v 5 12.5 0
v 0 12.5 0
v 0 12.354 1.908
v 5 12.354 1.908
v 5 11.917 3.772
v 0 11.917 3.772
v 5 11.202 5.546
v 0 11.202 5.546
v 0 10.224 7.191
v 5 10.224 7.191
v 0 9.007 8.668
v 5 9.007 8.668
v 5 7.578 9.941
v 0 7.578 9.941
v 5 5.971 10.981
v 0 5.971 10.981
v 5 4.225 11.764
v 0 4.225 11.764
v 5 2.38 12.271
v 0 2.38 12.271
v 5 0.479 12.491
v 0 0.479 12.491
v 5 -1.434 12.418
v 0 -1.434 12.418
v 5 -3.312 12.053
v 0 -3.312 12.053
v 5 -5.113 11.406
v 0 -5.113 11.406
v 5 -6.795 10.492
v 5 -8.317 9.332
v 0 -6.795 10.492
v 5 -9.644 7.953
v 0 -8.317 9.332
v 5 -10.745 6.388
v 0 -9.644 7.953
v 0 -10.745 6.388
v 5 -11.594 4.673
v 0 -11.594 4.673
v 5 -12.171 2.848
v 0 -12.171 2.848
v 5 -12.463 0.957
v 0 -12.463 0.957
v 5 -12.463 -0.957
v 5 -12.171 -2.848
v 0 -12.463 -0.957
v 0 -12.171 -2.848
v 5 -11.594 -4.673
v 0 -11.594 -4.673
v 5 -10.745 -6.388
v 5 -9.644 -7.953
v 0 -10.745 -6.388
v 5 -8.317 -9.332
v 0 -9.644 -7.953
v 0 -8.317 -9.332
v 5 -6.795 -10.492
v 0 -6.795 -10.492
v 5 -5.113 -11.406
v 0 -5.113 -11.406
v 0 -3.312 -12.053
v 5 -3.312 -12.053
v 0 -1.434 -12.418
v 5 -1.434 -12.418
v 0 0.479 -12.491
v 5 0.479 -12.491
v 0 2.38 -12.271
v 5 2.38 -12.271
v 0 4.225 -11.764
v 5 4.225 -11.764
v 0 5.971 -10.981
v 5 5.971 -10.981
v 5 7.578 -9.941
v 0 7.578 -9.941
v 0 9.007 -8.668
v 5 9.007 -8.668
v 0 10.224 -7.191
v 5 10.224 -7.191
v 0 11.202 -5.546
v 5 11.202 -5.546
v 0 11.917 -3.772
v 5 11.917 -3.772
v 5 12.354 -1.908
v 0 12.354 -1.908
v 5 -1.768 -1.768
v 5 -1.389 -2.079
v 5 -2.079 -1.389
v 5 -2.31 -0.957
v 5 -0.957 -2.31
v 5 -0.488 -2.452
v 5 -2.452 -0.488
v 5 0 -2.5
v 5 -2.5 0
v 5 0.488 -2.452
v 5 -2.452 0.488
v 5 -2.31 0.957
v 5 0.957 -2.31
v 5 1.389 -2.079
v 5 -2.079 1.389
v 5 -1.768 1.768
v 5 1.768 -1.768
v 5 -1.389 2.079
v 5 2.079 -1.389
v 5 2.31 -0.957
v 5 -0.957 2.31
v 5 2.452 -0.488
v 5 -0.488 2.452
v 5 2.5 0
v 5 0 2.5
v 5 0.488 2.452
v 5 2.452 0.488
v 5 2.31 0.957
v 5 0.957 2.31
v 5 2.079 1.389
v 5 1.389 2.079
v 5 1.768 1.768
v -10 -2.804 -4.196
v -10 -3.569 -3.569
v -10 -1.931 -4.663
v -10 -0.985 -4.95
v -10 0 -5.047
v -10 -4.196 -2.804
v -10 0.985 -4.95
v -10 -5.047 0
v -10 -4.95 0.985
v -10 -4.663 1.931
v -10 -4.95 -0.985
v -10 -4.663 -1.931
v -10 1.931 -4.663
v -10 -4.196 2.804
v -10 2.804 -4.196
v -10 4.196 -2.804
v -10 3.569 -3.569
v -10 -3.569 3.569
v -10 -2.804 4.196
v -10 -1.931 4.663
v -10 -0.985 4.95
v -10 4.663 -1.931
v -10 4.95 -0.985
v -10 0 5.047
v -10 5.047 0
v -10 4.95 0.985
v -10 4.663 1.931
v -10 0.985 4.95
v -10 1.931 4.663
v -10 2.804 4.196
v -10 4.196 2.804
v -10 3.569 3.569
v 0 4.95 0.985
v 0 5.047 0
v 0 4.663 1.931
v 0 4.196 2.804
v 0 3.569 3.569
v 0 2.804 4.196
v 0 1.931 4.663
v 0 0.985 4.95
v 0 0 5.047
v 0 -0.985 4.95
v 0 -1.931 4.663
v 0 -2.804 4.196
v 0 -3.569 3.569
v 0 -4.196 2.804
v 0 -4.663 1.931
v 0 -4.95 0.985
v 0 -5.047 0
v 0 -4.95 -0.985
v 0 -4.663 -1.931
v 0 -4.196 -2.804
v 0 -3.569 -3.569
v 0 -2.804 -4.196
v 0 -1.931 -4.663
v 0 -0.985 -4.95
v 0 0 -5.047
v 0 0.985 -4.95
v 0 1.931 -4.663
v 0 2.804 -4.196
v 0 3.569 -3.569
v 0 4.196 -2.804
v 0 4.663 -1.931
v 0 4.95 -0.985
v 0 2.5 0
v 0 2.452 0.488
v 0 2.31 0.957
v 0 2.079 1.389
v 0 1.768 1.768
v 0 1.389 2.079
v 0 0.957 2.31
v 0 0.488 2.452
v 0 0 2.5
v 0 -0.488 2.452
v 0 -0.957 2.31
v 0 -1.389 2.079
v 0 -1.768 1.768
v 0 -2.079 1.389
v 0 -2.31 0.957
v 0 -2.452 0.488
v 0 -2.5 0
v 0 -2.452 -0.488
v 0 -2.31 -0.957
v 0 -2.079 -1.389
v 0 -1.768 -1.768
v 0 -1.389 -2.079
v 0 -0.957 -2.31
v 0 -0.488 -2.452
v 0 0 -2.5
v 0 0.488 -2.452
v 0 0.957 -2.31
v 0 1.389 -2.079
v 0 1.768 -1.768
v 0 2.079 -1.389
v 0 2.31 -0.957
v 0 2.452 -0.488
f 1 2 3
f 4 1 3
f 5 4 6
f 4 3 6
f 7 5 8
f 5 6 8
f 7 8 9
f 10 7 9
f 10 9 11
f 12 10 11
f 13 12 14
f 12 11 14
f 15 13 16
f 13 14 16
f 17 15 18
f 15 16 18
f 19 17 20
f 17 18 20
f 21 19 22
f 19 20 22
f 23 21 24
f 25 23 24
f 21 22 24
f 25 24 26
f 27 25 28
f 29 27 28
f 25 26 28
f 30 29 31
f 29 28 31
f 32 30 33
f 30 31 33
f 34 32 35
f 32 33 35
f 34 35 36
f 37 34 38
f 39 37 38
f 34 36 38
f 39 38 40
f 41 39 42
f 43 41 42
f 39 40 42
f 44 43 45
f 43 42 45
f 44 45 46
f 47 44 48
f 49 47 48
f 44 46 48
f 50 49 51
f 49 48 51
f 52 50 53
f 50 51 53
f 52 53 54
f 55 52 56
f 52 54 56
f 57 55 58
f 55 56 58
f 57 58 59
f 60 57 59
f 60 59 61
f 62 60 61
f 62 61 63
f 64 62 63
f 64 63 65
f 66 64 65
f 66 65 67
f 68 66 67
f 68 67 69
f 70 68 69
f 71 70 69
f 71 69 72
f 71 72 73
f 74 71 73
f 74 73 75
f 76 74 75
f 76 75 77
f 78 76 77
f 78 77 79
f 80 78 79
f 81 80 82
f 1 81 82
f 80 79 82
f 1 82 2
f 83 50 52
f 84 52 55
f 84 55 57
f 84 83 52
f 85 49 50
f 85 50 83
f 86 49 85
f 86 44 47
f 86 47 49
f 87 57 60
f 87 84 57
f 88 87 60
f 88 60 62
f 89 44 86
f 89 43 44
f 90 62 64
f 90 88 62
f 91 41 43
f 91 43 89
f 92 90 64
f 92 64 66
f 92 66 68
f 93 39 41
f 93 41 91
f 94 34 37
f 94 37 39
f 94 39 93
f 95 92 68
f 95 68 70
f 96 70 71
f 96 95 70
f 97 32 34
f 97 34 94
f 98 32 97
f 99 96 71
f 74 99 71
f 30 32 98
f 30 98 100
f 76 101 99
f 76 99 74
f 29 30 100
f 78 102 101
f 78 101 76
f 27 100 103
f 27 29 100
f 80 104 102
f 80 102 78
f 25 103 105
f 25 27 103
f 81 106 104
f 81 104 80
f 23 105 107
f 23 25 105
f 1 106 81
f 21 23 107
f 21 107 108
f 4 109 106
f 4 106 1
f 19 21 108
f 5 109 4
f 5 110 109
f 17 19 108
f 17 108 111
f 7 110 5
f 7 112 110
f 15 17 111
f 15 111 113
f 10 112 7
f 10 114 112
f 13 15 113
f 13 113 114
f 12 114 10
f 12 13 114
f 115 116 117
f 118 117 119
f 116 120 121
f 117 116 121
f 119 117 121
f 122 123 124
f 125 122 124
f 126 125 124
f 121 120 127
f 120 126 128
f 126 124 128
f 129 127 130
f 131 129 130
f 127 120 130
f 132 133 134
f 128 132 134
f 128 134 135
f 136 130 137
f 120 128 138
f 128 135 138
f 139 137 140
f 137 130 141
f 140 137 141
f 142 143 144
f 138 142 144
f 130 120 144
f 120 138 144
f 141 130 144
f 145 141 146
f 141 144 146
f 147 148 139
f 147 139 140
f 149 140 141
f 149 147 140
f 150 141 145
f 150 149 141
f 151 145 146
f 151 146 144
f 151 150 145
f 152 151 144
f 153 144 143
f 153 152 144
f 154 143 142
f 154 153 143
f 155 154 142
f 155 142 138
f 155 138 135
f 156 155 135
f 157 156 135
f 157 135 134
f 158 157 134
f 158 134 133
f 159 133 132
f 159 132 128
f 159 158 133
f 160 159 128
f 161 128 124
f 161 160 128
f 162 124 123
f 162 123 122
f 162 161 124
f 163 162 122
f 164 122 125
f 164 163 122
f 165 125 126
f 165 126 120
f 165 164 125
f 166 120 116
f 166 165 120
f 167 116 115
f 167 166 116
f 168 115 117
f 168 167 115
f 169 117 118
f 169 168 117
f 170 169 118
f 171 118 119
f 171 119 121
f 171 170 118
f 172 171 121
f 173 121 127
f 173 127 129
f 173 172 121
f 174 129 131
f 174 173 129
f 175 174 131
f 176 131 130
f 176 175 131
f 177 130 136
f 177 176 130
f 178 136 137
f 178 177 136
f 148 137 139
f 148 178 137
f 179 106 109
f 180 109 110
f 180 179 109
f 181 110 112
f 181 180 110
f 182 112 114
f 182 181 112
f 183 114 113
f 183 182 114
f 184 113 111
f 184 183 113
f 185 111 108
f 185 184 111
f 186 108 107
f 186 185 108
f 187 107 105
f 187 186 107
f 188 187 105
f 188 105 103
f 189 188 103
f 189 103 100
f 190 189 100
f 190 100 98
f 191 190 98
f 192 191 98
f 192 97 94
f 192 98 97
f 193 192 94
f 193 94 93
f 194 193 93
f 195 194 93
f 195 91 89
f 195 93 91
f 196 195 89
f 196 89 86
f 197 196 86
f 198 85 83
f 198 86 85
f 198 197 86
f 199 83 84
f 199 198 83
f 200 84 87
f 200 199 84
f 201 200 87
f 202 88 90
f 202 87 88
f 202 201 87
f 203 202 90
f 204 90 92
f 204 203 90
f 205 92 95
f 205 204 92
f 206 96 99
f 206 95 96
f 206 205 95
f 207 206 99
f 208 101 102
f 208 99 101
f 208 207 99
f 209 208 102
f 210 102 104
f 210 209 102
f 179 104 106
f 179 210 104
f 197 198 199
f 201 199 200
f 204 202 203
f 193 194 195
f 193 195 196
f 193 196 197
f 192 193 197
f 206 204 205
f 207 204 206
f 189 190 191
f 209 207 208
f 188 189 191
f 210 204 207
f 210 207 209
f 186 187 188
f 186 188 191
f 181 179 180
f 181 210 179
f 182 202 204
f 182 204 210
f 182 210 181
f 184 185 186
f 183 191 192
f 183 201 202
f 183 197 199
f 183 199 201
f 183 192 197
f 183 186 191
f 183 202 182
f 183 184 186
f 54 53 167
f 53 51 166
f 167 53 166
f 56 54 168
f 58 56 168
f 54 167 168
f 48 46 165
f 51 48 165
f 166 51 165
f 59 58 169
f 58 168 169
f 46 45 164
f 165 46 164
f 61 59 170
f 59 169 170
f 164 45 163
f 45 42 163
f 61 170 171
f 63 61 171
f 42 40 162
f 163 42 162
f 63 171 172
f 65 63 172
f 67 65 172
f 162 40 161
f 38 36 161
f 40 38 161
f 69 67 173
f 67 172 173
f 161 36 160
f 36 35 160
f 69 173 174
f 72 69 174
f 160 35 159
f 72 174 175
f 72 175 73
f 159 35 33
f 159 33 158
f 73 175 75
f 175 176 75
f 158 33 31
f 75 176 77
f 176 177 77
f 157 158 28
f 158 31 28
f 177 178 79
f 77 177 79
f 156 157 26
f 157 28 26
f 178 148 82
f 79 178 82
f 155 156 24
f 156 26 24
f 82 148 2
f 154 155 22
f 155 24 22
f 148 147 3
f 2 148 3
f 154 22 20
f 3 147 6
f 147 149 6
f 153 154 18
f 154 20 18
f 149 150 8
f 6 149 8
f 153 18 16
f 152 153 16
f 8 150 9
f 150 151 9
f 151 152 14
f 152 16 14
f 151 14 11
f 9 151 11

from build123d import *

# Parameters (mm, degrees)
F0_R     = 12.5
F3_DEPTH = 5
F1_R     = 2.5
F4_DEPTH = 10
F2_R     = 2.5
F6_DEPTH = 3
F7_R     = 5.046872
F8_DEPTH = 10


with BuildPart() as f3:
    # F0 (on Right) → F3 (new body)
    with BuildSketch(Plane.YZ):
        Circle(F0_R)
    extrude(amount=F3_DEPTH)

    # F1 (on Right) → F4 (cut)
    with BuildSketch(Plane.YZ):
        Circle(F1_R)
    extrude(amount=F4_DEPTH, mode=Mode.SUBTRACT)

    # F2 (on Right) → F6 (cut)
    with BuildSketch(Plane.YZ):
        Circle(F2_R)
    extrude(amount=F6_DEPTH, mode=Mode.SUBTRACT)

    # F7 (on face) → F8 (join)
    with BuildSketch(Plane.YZ):
        Circle(F7_R)
    extrude(amount=-F8_DEPTH)


solid = f3.part
